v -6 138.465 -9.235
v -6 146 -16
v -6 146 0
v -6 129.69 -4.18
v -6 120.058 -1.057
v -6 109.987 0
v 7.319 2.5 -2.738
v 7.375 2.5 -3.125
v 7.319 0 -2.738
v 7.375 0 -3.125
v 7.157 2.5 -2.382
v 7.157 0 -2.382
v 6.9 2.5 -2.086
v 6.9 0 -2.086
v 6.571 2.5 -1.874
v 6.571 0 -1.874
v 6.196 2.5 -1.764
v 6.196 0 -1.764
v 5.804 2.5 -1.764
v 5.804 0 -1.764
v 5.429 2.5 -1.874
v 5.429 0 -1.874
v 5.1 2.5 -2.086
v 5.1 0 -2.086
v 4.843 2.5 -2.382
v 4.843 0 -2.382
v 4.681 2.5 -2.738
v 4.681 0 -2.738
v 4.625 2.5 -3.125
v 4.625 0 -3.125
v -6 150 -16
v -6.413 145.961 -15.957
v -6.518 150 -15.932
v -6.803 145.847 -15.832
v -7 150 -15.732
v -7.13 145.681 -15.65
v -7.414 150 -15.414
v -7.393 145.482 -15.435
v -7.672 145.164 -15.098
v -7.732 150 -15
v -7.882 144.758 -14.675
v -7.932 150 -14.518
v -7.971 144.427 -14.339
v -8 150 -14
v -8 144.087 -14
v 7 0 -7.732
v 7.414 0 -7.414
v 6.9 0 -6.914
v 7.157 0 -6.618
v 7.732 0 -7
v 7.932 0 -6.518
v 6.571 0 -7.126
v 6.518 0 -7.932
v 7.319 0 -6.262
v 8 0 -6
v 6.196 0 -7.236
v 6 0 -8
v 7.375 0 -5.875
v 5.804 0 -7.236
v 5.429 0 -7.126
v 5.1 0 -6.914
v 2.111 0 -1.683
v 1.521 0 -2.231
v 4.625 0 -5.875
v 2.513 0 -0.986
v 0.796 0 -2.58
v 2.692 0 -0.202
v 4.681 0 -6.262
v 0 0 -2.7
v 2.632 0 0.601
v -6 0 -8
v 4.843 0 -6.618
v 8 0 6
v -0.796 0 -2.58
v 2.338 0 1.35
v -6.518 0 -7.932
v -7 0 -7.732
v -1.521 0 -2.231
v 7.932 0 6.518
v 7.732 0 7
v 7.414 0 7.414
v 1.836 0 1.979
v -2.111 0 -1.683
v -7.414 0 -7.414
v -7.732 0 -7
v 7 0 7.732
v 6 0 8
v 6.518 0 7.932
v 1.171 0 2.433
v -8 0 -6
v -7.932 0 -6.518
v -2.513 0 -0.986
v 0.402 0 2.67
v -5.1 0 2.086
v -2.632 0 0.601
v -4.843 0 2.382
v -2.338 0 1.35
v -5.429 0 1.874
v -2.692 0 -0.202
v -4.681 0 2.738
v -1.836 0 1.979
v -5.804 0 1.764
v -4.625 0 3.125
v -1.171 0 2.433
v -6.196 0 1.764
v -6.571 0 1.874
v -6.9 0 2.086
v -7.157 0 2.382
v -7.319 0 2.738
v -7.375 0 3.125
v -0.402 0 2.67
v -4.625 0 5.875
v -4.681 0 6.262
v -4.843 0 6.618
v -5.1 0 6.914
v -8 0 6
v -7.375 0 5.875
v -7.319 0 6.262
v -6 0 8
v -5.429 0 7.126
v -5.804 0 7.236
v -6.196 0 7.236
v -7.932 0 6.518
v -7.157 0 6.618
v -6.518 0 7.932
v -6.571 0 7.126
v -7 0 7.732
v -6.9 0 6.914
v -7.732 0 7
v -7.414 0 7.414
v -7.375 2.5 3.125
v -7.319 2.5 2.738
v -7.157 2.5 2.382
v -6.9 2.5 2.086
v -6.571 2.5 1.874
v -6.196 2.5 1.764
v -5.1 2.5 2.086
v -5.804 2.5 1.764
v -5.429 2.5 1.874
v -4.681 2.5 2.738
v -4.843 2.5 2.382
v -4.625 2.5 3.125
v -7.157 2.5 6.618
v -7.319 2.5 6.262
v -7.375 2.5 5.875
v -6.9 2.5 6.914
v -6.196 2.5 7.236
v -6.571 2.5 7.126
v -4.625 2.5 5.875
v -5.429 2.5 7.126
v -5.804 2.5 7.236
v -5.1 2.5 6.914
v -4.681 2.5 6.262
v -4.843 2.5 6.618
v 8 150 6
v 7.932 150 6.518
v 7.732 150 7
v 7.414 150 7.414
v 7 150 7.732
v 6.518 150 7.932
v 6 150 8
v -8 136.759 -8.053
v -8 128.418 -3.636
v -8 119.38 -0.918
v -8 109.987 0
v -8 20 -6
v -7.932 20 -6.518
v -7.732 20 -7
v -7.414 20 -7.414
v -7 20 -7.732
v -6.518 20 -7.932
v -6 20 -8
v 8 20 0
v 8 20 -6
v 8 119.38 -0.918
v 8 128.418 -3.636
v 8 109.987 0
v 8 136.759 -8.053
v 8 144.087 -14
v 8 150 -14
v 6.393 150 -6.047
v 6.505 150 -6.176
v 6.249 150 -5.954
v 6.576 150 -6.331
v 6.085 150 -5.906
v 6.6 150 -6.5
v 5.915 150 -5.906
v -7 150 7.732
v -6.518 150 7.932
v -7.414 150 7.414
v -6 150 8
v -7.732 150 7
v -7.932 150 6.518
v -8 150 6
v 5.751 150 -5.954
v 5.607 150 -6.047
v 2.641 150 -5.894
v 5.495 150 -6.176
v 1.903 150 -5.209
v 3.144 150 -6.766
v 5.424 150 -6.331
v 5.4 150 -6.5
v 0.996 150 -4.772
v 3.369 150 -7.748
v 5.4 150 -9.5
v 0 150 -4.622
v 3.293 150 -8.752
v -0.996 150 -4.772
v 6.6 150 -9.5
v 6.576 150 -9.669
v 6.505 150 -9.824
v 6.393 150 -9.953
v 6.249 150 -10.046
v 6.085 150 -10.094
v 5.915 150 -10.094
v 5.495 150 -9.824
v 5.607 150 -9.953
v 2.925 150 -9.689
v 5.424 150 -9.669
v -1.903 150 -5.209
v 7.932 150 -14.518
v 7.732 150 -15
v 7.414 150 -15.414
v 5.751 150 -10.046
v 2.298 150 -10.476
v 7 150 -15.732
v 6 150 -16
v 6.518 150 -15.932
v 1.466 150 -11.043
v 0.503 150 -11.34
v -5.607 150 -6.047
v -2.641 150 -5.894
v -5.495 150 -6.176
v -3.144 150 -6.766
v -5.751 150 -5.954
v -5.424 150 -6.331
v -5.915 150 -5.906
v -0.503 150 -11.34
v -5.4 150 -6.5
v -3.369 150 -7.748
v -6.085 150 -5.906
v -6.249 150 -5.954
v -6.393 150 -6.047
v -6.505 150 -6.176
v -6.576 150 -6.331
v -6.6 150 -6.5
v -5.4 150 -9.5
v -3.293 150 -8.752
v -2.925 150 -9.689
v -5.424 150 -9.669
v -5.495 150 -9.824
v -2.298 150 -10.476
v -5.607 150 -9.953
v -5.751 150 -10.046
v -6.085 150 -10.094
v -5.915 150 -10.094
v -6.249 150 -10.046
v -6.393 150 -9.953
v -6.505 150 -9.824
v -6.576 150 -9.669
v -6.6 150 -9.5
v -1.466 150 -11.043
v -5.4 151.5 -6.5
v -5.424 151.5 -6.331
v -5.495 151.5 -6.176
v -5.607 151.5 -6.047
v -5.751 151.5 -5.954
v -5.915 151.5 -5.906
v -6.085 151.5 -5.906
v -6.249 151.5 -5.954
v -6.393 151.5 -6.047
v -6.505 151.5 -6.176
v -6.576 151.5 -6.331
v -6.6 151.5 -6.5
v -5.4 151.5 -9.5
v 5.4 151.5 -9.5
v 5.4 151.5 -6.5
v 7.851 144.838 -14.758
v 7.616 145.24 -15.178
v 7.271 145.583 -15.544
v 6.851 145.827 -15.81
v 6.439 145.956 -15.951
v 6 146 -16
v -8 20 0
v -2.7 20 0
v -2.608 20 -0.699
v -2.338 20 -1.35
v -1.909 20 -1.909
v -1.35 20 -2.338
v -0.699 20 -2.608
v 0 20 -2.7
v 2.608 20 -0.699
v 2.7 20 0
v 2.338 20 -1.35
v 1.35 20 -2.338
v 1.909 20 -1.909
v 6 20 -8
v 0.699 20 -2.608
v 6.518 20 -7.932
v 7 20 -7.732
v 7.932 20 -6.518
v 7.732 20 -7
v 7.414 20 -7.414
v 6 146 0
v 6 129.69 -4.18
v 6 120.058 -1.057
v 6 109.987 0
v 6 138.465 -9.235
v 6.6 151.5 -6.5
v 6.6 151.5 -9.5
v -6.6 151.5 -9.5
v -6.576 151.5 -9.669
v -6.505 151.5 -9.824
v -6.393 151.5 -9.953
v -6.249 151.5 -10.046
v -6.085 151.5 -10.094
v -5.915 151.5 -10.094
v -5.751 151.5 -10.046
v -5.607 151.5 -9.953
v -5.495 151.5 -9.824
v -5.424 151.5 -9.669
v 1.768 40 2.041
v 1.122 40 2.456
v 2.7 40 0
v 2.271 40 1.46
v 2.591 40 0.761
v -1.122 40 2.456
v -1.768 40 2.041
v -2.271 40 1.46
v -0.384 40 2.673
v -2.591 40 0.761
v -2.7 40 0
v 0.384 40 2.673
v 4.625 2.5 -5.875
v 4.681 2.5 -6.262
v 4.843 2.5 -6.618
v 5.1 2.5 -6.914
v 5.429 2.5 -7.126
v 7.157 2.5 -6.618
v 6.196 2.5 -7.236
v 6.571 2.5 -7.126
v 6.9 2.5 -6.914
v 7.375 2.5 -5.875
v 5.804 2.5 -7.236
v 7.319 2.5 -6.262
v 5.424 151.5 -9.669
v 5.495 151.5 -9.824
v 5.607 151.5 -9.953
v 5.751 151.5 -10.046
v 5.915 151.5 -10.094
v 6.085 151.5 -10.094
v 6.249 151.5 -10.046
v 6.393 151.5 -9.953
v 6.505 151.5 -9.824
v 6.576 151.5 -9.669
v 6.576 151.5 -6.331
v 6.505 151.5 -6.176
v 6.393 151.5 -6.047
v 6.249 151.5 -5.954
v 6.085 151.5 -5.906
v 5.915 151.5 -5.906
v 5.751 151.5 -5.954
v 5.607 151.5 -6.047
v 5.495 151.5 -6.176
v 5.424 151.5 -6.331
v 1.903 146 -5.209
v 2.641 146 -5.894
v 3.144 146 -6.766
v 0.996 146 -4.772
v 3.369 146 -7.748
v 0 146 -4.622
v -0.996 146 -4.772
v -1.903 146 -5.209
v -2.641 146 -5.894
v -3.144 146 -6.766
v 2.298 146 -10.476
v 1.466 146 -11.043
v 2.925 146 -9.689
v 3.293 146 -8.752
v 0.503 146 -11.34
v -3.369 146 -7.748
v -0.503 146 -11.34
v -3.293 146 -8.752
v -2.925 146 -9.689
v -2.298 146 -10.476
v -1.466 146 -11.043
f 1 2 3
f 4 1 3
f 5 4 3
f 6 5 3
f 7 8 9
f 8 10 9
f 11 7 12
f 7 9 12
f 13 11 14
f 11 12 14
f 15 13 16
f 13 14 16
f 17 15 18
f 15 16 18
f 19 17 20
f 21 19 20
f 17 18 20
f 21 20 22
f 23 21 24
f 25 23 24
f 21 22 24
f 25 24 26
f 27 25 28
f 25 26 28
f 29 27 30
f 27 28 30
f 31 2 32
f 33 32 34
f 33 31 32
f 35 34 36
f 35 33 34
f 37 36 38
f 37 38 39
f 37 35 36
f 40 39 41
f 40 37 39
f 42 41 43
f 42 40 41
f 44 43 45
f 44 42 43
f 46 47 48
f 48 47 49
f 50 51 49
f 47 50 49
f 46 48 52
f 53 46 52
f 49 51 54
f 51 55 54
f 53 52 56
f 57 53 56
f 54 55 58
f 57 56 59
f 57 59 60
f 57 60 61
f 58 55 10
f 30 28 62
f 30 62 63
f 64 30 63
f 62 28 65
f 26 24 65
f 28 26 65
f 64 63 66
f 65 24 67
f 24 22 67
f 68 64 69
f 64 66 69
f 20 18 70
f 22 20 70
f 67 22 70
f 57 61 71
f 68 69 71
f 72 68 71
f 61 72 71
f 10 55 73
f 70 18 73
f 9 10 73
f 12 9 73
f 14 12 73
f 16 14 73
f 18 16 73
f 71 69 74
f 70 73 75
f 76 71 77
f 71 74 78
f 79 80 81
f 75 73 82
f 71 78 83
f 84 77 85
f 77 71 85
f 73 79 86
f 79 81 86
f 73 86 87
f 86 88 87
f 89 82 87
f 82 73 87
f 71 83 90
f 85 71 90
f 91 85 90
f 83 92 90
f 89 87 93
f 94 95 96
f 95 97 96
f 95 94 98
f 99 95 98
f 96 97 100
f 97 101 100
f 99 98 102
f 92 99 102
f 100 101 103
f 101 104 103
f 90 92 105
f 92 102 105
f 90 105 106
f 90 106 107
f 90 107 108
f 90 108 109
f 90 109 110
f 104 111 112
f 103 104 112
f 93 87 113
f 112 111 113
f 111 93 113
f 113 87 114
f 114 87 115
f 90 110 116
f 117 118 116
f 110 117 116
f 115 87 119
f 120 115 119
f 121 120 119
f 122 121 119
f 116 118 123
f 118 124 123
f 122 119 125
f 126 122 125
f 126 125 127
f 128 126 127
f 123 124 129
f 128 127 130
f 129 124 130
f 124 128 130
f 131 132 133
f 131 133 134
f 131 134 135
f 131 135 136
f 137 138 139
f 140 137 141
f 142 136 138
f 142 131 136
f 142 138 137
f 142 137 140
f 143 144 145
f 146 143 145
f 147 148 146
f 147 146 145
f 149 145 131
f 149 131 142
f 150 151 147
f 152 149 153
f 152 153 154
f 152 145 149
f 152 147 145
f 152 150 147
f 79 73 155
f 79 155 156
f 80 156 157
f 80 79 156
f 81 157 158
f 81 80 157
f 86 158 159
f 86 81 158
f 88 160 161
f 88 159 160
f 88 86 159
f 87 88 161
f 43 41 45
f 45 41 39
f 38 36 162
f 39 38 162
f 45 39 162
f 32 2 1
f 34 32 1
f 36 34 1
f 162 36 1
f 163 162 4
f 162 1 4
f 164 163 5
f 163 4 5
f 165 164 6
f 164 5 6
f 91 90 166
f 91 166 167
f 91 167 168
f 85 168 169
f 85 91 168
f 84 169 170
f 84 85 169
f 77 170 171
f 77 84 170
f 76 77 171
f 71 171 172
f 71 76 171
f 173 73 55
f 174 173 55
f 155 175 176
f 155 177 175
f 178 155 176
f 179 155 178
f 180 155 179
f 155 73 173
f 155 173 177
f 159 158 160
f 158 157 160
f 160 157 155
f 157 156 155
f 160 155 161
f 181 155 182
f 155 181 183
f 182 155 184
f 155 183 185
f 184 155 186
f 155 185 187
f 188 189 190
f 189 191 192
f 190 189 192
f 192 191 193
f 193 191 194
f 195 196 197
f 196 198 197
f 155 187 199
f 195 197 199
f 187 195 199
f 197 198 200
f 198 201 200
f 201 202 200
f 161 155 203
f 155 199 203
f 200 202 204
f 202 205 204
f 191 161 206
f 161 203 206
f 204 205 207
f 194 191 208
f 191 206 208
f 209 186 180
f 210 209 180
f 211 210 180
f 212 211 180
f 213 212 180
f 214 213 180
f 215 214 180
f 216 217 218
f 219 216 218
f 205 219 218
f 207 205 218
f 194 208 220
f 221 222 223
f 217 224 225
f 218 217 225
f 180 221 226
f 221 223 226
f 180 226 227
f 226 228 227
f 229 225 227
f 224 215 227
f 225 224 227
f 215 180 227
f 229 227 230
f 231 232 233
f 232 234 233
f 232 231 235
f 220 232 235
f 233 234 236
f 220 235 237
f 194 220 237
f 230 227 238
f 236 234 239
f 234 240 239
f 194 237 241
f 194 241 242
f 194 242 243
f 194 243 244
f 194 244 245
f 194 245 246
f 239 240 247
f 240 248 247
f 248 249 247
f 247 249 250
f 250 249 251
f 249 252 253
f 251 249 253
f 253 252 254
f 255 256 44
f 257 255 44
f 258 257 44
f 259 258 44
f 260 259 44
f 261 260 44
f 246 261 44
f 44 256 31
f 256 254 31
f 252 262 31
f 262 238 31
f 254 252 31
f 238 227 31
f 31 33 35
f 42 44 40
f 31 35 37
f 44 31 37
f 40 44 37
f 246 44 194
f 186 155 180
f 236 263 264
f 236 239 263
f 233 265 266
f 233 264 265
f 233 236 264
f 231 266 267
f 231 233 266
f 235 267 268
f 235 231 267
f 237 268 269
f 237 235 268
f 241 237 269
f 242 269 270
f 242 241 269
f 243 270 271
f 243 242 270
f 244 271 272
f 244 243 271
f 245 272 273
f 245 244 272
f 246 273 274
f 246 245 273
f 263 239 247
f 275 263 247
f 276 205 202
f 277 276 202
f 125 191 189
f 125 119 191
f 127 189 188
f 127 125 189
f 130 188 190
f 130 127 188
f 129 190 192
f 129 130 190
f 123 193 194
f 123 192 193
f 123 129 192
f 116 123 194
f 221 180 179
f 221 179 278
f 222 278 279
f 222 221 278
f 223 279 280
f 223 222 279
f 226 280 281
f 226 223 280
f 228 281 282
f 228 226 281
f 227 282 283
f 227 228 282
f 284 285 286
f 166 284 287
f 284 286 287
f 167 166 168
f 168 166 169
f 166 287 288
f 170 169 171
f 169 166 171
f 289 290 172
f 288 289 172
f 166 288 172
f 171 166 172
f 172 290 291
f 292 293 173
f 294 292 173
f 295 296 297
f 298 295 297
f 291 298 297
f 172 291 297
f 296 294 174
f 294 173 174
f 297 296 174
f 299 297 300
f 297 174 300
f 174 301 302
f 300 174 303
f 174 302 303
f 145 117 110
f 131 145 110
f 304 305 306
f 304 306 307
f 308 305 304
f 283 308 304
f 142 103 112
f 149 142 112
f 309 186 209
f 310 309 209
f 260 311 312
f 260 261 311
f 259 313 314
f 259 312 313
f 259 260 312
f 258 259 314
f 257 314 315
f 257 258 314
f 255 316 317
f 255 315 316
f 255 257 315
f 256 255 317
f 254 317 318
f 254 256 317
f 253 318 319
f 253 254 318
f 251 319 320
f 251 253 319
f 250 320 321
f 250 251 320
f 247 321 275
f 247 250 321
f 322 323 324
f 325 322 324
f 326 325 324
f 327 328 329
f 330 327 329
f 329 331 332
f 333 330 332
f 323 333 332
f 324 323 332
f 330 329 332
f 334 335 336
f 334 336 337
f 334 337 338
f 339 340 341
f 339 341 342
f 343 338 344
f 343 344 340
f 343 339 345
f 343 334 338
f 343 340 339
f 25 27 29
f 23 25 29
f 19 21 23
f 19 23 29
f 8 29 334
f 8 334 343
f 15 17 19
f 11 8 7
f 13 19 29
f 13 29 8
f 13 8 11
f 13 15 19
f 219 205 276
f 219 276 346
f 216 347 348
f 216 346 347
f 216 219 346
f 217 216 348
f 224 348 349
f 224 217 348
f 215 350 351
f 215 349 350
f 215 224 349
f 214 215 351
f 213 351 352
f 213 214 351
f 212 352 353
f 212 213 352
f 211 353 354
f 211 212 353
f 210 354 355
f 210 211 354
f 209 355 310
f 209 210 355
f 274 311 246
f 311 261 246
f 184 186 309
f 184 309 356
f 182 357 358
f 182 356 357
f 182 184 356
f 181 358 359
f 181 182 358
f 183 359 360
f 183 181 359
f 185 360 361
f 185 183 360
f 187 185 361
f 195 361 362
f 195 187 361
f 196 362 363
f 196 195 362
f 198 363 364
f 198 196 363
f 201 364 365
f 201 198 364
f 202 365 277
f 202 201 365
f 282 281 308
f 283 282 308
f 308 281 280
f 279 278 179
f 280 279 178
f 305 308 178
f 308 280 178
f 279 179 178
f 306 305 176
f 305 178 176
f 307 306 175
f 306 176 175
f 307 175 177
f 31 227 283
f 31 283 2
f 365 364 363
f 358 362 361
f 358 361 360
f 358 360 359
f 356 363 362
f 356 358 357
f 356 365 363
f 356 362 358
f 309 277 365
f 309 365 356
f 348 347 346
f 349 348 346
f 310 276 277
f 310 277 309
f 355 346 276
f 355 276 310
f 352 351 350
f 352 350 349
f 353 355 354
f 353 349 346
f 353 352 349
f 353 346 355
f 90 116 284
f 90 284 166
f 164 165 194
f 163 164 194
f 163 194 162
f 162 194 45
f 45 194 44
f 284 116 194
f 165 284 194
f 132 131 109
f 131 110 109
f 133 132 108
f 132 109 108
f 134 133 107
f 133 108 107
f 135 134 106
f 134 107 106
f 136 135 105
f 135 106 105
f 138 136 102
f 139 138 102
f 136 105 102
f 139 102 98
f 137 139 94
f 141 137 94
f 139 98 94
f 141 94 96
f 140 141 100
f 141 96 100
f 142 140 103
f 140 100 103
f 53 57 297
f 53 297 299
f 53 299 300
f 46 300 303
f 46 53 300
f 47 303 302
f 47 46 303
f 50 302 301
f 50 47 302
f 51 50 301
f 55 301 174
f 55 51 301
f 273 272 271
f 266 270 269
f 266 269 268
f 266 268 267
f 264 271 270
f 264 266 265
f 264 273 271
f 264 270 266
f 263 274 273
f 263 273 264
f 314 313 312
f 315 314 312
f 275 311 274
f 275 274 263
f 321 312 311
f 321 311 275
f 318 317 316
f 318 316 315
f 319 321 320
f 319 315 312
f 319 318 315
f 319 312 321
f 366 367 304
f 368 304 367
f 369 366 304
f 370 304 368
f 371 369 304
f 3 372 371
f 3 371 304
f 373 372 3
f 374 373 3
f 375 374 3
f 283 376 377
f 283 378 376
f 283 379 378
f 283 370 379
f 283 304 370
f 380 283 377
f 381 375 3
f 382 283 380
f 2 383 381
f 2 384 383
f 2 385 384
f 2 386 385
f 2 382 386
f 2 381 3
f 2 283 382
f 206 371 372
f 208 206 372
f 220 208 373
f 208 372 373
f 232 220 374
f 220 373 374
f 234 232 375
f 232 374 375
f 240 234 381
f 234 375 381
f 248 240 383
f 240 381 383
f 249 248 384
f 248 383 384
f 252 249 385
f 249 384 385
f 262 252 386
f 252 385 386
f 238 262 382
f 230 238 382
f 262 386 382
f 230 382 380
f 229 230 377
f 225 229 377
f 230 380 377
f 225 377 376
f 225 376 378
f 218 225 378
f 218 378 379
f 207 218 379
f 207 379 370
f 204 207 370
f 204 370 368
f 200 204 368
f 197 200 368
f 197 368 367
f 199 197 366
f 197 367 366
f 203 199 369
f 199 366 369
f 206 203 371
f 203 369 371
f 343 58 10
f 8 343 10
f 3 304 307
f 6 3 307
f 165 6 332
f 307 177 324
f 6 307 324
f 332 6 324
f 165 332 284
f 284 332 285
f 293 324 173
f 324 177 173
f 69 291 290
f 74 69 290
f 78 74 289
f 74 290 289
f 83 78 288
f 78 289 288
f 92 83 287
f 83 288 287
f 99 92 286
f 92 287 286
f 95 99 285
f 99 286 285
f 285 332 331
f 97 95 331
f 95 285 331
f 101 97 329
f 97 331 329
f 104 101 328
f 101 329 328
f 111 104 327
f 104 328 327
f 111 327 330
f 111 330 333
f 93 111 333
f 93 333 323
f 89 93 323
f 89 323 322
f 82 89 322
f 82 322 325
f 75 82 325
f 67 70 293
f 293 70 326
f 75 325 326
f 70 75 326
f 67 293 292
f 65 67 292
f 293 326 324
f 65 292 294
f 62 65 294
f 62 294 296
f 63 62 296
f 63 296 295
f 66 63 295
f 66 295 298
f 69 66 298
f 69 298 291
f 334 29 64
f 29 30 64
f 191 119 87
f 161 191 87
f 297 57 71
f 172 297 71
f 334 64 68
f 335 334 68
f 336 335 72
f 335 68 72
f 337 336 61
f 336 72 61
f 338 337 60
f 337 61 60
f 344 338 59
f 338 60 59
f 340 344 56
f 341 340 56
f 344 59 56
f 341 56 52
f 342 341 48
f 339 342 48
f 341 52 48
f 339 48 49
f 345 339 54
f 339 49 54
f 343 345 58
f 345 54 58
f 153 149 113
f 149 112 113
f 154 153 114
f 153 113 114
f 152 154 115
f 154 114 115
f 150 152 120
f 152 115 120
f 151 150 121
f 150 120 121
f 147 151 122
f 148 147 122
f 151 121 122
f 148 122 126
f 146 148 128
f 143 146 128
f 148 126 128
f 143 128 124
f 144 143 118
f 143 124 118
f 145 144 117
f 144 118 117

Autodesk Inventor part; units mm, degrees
ref_plane "YZ Plane" through (0, 0, 0) normal (1, 0, 0) x (0, 1, 0)
ref_plane "XZ Plane" through (0, 0, 0) normal (0, 1, 0) x (-1, 0, 0)
sketch "Sketch1" plane through (0, 0, 0) normal (0, 1, 0) x (-1, 0, 0)
  line L0 (6, 8) -> (-6, 8)
  line L1 (-8, 6) -> (-8, -6)
  line L2 (-6, -8) -> (6, -8)
  line L3 (8, -6) -> (8, 6)
  arc A0 (8, 6) -> (6, 8) centre (6, 6) ccw
  arc A1 (-6, 8) -> (-8, 6) centre (-6, 6) ccw
  arc A2 (-8, -6) -> (-6, -8) centre (-6, -6) ccw
  arc A3 (6, -8) -> (8, -6) centre (6, -6) ccw
  point P0 (0, 0)
  point P1 (8, 8)
  point P2 (-8, 8)
  point P3 (8, -8)
  dimension "d0" = 16
  dimension "d1" = 16
  dimension "d2" = 8
  dimension "d3" = 8
  dimension "d4" = 2
extrude "Extrusion1" add sketch "Sketch1" along normal blind 150
sketch "Sketch2" plane through (0, 0, 0) normal (0, -1, 0) x (1, 0, 0)
  line L0 (-6, 5.875) -> (-6, 3.125) construction
  line L1 (-7.375, 5.875) -> (-7.375, 3.125)
  line L2 (-4.625, 3.125) -> (-4.625, 5.875)
  arc A0 (-4.625, 5.875) -> (-7.375, 5.875) centre (-6, 5.875) ccw
  arc A1 (-7.375, 3.125) -> (-4.625, 3.125) centre (-6, 3.125) ccw
  line L3 (6, -3.125) -> (6, -5.875) construction
  line L4 (4.625, -3.125) -> (4.625, -5.875)
  line L5 (7.375, -5.875) -> (7.375, -3.125)
  arc A2 (7.375, -3.125) -> (4.625, -3.125) centre (6, -3.125) ccw
  arc A3 (4.625, -5.875) -> (7.375, -5.875) centre (6, -5.875) ccw
  point P0 (0, 0)
  point P1 (0, 0)
  point P2 (-6, 4.5)
  point P3 (6, -4.5)
  dimension "d7" = 2.75
  dimension "d8" = 12
  dimension "d9" = 6
  dimension "d10" = 9
  dimension "d11" = 4.5
  dimension "d12" = 2.75
  dimension "d13" = 2.75
  dimension "d14" = 2.75
extrude "Extrusion2" cut sketch "Sketch2" against normal blind 2.5
sketch "Sketch3" plane through (0, 150, 0) normal (0, 1, 0) x (1, 0, 0)
  line L0 (-6, 9.5) -> (-6, 6.5) construction
  line L1 (-6.6, 9.5) -> (-6.6, 6.5)
  line L2 (-5.4, 6.5) -> (-5.4, 9.5)
  arc A0 (-5.4, 9.5) -> (-6.6, 9.5) centre (-6, 9.5) ccw
  arc A1 (-6.6, 6.5) -> (-5.4, 6.5) centre (-6, 6.5) ccw
  line L3 (6, 9.5) -> (6, 6.5) construction
  line L4 (5.4, 9.5) -> (5.4, 6.5)
  line L5 (6.6, 6.5) -> (6.6, 9.5)
  arc A2 (6.6, 9.5) -> (5.4, 9.5) centre (6, 9.5) ccw
  arc A3 (5.4, 6.5) -> (6.6, 6.5) centre (6, 6.5) ccw
  line L6 (-6, 8) -> (6, 8) construction
  line L7 (6, 8) -> (-6, 8) projected
  circle A4 centre (0, 0) radius 3.378 construction
  circle A5 centre (0, 8) radius 3.494
  dimension "d25" = 0.6
  dimension "d26" = 0.6
  dimension "d27" = 3
  dimension "d30" = 12
  dimension "d32" = 3
  dimension "d35" = 6
  dimension "d36" = 0
extrude "Extrusion3" add sketch "Sketch3" along normal blind 1.5 contours A0 L2 A1 L1 | L4 A2 L5 A3
ref_plane "Work Plane1" through (6, 0, -16) normal (0, 0, -1) x (-1, 0, 0)
sketch "Sketch4" plane through (6, 0, -16) normal (0, 0, -1) x (-1, 0, 0)
  line L0 (-2, 0) -> (-2, 150) projected
  line L1 (14, 0) -> (14, 150) projected
  line L2 (-2, 150) -> (14, 150)
  line L3 (14, 150) -> (14, 135)
  line L4 (14, 135) -> (-2, 135)
  line L5 (-2, 135) -> (-2, 150)
  point P0 (6, 0)
  dimension "d38" = 15
extrude "Extrusion4" add sketch "Sketch4" against normal blind 10
fillet "Fillet1" radius 2 2 edges at (8, 142.5, -16) (-8, 142.5, -16)
sketch "Sketch5" plane through (8, 0, 6) normal (1, 0, 0) x (0, 0, -1)
  line L0 (22, 135) -> (22, 150) projected
  line L1 (22, 146) -> (6, 146)
  line L2 (6, 146) -> (6, 20)
  line L3 (6, 20) -> (22, 20)
  line L4 (22, 20) -> (22, 146)
  line L5 (-2, 0) -> (-2, 150) projected
  line L6 (0, 150) -> (20, 150) projected
  point P0 (6, 0)
  dimension "d42" = 8
  dimension "d43" = 20
  dimension "d44" = 4
extrude "Extrusion5" cut sketch "Sketch5" against normal up to surface (16 mm away)
hole "Hole2" at (0, 150, -8) direction (0, -1, 0) diameter 6.756 depth 7 clearance for "Flat Head Machine Screw (82)" size "1/4" standard "Ansi Unified Screw Threads"
sketch "Sketch6" plane through (8, 0, 6) normal (1, 0, 0) x (0, 0, -1)
  line L0 (22, 146) -> (20, 146) projected
  arc A0 (22, 146) -> (6, 109.9866) centre (54.5302, 109.9866) ccw
  line L1 (20, 146) -> (6, 146) projected
  line L2 (6, 109.9866) -> (6, 146)
  line L3 (6, 146) -> (22, 146)
  point P0 (6, 0)
extrude "Extrusion6" add sketch "Sketch6" against normal up to surface (16 mm away)
sketch "Sketch7" plane through (0, 150, 0) normal (0, 1, 0) x (1, 0, 0)
  circle A0 centre (0, 8) radius 3.378 construction
  arc A1 (-6, 16) -> (-8, 14) centre (-6, 14) ccw projected
  line L0 (-8, 14) -> (-8, -6) projected
  arc A2 (-8, -6) -> (-6, -8) centre (-6, -6) ccw projected
  line L1 (-6, -8) -> (6, -8) projected
  arc A3 (6, -8) -> (8, -6) centre (6, -6) ccw projected
  line L2 (8, -6) -> (8, 14) projected
  arc A4 (8, 14) -> (6, 16) centre (6, 14) ccw projected
  line L3 (6, 16) -> (-6, 16) projected
  line L4 (6.6, 6.5) -> (6.6, 9.5) construction
  arc A5 (5.4, 6.5) -> (6.6, 6.5) centre (6, 6.5) ccw construction
  line L5 (5.4, 9.5) -> (5.4, 6.5) construction
  arc A6 (6.6, 9.5) -> (5.4, 9.5) centre (6, 9.5) ccw construction
  line L6 (-6.6, 9.5) -> (-6.6, 6.5) construction
  arc A7 (-5.4, 9.5) -> (-6.6, 9.5) centre (-6, 9.5) ccw construction
  line L7 (-5.4, 9.5) -> (-5.4, 6.5) construction
  arc A8 (-6.6, 6.5) -> (-5.4, 6.5) centre (-6, 6.5) ccw construction
  line L8 (-17.4625, -22.225) -> (15.875, -22.225)
  line L9 (15.875, -22.225) -> (15.875, 22.225)
  line L10 (15.875, 22.225) -> (-17.4625, 22.225)
  line L11 (-17.4625, 22.225) -> (-17.4625, -22.225)
  point P0 (0, 0)
extrude "Extrusion7" cut sketch "Sketch7" against normal blind 10
sketch "Sketch8" plane through (6, 0, -16) normal (0, 0, -1) x (-1, 0, 0)
  line L0 (0, 146) -> (12, 146) projected
  line L1 (14, 109.9866) -> (-2, 109.9866) projected
  line L2 (0, 146) -> (12, 146)
  line L3 (12, 146) -> (12, 109.9866)
  line L4 (12, 109.9866) -> (0, 109.9866)
  line L5 (0, 109.9866) -> (0, 146)
  line L6 (-2, 109.9866) -> (-2, 144.0871) projected
  line L7 (14, 109.9866) -> (14, 144.0871) projected
  point P0 (6, 0)
  dimension "d68" = 2
  dimension "d69" = 2
extrude "Extrusion8" cut sketch "Sketch8" against normal up to surface (16 mm away)
hole "Hole3" at (0, 0, 0) direction (0, 1, 0) diameter 5.4 depth 40
equation "\"d1\" = d0"
equation "\"d2\" = 0.5 * d0"
equation "\"d3\" = d2"
equation "\"d9\" = 0.5 * d8"
equation "\"d11\" = 0.5 * d10"
equation "\"d12\" = d7"
equation "\"d13\" = d7"
equation "\"d14\" = d7"
equation "\"d26\" = d25"
equation "\"d27\" = d32"
equation "\"d35\" = 0.5 * d30"
equation "\"d69\" = d68"
properties part number "Camera Mount 30mm"
